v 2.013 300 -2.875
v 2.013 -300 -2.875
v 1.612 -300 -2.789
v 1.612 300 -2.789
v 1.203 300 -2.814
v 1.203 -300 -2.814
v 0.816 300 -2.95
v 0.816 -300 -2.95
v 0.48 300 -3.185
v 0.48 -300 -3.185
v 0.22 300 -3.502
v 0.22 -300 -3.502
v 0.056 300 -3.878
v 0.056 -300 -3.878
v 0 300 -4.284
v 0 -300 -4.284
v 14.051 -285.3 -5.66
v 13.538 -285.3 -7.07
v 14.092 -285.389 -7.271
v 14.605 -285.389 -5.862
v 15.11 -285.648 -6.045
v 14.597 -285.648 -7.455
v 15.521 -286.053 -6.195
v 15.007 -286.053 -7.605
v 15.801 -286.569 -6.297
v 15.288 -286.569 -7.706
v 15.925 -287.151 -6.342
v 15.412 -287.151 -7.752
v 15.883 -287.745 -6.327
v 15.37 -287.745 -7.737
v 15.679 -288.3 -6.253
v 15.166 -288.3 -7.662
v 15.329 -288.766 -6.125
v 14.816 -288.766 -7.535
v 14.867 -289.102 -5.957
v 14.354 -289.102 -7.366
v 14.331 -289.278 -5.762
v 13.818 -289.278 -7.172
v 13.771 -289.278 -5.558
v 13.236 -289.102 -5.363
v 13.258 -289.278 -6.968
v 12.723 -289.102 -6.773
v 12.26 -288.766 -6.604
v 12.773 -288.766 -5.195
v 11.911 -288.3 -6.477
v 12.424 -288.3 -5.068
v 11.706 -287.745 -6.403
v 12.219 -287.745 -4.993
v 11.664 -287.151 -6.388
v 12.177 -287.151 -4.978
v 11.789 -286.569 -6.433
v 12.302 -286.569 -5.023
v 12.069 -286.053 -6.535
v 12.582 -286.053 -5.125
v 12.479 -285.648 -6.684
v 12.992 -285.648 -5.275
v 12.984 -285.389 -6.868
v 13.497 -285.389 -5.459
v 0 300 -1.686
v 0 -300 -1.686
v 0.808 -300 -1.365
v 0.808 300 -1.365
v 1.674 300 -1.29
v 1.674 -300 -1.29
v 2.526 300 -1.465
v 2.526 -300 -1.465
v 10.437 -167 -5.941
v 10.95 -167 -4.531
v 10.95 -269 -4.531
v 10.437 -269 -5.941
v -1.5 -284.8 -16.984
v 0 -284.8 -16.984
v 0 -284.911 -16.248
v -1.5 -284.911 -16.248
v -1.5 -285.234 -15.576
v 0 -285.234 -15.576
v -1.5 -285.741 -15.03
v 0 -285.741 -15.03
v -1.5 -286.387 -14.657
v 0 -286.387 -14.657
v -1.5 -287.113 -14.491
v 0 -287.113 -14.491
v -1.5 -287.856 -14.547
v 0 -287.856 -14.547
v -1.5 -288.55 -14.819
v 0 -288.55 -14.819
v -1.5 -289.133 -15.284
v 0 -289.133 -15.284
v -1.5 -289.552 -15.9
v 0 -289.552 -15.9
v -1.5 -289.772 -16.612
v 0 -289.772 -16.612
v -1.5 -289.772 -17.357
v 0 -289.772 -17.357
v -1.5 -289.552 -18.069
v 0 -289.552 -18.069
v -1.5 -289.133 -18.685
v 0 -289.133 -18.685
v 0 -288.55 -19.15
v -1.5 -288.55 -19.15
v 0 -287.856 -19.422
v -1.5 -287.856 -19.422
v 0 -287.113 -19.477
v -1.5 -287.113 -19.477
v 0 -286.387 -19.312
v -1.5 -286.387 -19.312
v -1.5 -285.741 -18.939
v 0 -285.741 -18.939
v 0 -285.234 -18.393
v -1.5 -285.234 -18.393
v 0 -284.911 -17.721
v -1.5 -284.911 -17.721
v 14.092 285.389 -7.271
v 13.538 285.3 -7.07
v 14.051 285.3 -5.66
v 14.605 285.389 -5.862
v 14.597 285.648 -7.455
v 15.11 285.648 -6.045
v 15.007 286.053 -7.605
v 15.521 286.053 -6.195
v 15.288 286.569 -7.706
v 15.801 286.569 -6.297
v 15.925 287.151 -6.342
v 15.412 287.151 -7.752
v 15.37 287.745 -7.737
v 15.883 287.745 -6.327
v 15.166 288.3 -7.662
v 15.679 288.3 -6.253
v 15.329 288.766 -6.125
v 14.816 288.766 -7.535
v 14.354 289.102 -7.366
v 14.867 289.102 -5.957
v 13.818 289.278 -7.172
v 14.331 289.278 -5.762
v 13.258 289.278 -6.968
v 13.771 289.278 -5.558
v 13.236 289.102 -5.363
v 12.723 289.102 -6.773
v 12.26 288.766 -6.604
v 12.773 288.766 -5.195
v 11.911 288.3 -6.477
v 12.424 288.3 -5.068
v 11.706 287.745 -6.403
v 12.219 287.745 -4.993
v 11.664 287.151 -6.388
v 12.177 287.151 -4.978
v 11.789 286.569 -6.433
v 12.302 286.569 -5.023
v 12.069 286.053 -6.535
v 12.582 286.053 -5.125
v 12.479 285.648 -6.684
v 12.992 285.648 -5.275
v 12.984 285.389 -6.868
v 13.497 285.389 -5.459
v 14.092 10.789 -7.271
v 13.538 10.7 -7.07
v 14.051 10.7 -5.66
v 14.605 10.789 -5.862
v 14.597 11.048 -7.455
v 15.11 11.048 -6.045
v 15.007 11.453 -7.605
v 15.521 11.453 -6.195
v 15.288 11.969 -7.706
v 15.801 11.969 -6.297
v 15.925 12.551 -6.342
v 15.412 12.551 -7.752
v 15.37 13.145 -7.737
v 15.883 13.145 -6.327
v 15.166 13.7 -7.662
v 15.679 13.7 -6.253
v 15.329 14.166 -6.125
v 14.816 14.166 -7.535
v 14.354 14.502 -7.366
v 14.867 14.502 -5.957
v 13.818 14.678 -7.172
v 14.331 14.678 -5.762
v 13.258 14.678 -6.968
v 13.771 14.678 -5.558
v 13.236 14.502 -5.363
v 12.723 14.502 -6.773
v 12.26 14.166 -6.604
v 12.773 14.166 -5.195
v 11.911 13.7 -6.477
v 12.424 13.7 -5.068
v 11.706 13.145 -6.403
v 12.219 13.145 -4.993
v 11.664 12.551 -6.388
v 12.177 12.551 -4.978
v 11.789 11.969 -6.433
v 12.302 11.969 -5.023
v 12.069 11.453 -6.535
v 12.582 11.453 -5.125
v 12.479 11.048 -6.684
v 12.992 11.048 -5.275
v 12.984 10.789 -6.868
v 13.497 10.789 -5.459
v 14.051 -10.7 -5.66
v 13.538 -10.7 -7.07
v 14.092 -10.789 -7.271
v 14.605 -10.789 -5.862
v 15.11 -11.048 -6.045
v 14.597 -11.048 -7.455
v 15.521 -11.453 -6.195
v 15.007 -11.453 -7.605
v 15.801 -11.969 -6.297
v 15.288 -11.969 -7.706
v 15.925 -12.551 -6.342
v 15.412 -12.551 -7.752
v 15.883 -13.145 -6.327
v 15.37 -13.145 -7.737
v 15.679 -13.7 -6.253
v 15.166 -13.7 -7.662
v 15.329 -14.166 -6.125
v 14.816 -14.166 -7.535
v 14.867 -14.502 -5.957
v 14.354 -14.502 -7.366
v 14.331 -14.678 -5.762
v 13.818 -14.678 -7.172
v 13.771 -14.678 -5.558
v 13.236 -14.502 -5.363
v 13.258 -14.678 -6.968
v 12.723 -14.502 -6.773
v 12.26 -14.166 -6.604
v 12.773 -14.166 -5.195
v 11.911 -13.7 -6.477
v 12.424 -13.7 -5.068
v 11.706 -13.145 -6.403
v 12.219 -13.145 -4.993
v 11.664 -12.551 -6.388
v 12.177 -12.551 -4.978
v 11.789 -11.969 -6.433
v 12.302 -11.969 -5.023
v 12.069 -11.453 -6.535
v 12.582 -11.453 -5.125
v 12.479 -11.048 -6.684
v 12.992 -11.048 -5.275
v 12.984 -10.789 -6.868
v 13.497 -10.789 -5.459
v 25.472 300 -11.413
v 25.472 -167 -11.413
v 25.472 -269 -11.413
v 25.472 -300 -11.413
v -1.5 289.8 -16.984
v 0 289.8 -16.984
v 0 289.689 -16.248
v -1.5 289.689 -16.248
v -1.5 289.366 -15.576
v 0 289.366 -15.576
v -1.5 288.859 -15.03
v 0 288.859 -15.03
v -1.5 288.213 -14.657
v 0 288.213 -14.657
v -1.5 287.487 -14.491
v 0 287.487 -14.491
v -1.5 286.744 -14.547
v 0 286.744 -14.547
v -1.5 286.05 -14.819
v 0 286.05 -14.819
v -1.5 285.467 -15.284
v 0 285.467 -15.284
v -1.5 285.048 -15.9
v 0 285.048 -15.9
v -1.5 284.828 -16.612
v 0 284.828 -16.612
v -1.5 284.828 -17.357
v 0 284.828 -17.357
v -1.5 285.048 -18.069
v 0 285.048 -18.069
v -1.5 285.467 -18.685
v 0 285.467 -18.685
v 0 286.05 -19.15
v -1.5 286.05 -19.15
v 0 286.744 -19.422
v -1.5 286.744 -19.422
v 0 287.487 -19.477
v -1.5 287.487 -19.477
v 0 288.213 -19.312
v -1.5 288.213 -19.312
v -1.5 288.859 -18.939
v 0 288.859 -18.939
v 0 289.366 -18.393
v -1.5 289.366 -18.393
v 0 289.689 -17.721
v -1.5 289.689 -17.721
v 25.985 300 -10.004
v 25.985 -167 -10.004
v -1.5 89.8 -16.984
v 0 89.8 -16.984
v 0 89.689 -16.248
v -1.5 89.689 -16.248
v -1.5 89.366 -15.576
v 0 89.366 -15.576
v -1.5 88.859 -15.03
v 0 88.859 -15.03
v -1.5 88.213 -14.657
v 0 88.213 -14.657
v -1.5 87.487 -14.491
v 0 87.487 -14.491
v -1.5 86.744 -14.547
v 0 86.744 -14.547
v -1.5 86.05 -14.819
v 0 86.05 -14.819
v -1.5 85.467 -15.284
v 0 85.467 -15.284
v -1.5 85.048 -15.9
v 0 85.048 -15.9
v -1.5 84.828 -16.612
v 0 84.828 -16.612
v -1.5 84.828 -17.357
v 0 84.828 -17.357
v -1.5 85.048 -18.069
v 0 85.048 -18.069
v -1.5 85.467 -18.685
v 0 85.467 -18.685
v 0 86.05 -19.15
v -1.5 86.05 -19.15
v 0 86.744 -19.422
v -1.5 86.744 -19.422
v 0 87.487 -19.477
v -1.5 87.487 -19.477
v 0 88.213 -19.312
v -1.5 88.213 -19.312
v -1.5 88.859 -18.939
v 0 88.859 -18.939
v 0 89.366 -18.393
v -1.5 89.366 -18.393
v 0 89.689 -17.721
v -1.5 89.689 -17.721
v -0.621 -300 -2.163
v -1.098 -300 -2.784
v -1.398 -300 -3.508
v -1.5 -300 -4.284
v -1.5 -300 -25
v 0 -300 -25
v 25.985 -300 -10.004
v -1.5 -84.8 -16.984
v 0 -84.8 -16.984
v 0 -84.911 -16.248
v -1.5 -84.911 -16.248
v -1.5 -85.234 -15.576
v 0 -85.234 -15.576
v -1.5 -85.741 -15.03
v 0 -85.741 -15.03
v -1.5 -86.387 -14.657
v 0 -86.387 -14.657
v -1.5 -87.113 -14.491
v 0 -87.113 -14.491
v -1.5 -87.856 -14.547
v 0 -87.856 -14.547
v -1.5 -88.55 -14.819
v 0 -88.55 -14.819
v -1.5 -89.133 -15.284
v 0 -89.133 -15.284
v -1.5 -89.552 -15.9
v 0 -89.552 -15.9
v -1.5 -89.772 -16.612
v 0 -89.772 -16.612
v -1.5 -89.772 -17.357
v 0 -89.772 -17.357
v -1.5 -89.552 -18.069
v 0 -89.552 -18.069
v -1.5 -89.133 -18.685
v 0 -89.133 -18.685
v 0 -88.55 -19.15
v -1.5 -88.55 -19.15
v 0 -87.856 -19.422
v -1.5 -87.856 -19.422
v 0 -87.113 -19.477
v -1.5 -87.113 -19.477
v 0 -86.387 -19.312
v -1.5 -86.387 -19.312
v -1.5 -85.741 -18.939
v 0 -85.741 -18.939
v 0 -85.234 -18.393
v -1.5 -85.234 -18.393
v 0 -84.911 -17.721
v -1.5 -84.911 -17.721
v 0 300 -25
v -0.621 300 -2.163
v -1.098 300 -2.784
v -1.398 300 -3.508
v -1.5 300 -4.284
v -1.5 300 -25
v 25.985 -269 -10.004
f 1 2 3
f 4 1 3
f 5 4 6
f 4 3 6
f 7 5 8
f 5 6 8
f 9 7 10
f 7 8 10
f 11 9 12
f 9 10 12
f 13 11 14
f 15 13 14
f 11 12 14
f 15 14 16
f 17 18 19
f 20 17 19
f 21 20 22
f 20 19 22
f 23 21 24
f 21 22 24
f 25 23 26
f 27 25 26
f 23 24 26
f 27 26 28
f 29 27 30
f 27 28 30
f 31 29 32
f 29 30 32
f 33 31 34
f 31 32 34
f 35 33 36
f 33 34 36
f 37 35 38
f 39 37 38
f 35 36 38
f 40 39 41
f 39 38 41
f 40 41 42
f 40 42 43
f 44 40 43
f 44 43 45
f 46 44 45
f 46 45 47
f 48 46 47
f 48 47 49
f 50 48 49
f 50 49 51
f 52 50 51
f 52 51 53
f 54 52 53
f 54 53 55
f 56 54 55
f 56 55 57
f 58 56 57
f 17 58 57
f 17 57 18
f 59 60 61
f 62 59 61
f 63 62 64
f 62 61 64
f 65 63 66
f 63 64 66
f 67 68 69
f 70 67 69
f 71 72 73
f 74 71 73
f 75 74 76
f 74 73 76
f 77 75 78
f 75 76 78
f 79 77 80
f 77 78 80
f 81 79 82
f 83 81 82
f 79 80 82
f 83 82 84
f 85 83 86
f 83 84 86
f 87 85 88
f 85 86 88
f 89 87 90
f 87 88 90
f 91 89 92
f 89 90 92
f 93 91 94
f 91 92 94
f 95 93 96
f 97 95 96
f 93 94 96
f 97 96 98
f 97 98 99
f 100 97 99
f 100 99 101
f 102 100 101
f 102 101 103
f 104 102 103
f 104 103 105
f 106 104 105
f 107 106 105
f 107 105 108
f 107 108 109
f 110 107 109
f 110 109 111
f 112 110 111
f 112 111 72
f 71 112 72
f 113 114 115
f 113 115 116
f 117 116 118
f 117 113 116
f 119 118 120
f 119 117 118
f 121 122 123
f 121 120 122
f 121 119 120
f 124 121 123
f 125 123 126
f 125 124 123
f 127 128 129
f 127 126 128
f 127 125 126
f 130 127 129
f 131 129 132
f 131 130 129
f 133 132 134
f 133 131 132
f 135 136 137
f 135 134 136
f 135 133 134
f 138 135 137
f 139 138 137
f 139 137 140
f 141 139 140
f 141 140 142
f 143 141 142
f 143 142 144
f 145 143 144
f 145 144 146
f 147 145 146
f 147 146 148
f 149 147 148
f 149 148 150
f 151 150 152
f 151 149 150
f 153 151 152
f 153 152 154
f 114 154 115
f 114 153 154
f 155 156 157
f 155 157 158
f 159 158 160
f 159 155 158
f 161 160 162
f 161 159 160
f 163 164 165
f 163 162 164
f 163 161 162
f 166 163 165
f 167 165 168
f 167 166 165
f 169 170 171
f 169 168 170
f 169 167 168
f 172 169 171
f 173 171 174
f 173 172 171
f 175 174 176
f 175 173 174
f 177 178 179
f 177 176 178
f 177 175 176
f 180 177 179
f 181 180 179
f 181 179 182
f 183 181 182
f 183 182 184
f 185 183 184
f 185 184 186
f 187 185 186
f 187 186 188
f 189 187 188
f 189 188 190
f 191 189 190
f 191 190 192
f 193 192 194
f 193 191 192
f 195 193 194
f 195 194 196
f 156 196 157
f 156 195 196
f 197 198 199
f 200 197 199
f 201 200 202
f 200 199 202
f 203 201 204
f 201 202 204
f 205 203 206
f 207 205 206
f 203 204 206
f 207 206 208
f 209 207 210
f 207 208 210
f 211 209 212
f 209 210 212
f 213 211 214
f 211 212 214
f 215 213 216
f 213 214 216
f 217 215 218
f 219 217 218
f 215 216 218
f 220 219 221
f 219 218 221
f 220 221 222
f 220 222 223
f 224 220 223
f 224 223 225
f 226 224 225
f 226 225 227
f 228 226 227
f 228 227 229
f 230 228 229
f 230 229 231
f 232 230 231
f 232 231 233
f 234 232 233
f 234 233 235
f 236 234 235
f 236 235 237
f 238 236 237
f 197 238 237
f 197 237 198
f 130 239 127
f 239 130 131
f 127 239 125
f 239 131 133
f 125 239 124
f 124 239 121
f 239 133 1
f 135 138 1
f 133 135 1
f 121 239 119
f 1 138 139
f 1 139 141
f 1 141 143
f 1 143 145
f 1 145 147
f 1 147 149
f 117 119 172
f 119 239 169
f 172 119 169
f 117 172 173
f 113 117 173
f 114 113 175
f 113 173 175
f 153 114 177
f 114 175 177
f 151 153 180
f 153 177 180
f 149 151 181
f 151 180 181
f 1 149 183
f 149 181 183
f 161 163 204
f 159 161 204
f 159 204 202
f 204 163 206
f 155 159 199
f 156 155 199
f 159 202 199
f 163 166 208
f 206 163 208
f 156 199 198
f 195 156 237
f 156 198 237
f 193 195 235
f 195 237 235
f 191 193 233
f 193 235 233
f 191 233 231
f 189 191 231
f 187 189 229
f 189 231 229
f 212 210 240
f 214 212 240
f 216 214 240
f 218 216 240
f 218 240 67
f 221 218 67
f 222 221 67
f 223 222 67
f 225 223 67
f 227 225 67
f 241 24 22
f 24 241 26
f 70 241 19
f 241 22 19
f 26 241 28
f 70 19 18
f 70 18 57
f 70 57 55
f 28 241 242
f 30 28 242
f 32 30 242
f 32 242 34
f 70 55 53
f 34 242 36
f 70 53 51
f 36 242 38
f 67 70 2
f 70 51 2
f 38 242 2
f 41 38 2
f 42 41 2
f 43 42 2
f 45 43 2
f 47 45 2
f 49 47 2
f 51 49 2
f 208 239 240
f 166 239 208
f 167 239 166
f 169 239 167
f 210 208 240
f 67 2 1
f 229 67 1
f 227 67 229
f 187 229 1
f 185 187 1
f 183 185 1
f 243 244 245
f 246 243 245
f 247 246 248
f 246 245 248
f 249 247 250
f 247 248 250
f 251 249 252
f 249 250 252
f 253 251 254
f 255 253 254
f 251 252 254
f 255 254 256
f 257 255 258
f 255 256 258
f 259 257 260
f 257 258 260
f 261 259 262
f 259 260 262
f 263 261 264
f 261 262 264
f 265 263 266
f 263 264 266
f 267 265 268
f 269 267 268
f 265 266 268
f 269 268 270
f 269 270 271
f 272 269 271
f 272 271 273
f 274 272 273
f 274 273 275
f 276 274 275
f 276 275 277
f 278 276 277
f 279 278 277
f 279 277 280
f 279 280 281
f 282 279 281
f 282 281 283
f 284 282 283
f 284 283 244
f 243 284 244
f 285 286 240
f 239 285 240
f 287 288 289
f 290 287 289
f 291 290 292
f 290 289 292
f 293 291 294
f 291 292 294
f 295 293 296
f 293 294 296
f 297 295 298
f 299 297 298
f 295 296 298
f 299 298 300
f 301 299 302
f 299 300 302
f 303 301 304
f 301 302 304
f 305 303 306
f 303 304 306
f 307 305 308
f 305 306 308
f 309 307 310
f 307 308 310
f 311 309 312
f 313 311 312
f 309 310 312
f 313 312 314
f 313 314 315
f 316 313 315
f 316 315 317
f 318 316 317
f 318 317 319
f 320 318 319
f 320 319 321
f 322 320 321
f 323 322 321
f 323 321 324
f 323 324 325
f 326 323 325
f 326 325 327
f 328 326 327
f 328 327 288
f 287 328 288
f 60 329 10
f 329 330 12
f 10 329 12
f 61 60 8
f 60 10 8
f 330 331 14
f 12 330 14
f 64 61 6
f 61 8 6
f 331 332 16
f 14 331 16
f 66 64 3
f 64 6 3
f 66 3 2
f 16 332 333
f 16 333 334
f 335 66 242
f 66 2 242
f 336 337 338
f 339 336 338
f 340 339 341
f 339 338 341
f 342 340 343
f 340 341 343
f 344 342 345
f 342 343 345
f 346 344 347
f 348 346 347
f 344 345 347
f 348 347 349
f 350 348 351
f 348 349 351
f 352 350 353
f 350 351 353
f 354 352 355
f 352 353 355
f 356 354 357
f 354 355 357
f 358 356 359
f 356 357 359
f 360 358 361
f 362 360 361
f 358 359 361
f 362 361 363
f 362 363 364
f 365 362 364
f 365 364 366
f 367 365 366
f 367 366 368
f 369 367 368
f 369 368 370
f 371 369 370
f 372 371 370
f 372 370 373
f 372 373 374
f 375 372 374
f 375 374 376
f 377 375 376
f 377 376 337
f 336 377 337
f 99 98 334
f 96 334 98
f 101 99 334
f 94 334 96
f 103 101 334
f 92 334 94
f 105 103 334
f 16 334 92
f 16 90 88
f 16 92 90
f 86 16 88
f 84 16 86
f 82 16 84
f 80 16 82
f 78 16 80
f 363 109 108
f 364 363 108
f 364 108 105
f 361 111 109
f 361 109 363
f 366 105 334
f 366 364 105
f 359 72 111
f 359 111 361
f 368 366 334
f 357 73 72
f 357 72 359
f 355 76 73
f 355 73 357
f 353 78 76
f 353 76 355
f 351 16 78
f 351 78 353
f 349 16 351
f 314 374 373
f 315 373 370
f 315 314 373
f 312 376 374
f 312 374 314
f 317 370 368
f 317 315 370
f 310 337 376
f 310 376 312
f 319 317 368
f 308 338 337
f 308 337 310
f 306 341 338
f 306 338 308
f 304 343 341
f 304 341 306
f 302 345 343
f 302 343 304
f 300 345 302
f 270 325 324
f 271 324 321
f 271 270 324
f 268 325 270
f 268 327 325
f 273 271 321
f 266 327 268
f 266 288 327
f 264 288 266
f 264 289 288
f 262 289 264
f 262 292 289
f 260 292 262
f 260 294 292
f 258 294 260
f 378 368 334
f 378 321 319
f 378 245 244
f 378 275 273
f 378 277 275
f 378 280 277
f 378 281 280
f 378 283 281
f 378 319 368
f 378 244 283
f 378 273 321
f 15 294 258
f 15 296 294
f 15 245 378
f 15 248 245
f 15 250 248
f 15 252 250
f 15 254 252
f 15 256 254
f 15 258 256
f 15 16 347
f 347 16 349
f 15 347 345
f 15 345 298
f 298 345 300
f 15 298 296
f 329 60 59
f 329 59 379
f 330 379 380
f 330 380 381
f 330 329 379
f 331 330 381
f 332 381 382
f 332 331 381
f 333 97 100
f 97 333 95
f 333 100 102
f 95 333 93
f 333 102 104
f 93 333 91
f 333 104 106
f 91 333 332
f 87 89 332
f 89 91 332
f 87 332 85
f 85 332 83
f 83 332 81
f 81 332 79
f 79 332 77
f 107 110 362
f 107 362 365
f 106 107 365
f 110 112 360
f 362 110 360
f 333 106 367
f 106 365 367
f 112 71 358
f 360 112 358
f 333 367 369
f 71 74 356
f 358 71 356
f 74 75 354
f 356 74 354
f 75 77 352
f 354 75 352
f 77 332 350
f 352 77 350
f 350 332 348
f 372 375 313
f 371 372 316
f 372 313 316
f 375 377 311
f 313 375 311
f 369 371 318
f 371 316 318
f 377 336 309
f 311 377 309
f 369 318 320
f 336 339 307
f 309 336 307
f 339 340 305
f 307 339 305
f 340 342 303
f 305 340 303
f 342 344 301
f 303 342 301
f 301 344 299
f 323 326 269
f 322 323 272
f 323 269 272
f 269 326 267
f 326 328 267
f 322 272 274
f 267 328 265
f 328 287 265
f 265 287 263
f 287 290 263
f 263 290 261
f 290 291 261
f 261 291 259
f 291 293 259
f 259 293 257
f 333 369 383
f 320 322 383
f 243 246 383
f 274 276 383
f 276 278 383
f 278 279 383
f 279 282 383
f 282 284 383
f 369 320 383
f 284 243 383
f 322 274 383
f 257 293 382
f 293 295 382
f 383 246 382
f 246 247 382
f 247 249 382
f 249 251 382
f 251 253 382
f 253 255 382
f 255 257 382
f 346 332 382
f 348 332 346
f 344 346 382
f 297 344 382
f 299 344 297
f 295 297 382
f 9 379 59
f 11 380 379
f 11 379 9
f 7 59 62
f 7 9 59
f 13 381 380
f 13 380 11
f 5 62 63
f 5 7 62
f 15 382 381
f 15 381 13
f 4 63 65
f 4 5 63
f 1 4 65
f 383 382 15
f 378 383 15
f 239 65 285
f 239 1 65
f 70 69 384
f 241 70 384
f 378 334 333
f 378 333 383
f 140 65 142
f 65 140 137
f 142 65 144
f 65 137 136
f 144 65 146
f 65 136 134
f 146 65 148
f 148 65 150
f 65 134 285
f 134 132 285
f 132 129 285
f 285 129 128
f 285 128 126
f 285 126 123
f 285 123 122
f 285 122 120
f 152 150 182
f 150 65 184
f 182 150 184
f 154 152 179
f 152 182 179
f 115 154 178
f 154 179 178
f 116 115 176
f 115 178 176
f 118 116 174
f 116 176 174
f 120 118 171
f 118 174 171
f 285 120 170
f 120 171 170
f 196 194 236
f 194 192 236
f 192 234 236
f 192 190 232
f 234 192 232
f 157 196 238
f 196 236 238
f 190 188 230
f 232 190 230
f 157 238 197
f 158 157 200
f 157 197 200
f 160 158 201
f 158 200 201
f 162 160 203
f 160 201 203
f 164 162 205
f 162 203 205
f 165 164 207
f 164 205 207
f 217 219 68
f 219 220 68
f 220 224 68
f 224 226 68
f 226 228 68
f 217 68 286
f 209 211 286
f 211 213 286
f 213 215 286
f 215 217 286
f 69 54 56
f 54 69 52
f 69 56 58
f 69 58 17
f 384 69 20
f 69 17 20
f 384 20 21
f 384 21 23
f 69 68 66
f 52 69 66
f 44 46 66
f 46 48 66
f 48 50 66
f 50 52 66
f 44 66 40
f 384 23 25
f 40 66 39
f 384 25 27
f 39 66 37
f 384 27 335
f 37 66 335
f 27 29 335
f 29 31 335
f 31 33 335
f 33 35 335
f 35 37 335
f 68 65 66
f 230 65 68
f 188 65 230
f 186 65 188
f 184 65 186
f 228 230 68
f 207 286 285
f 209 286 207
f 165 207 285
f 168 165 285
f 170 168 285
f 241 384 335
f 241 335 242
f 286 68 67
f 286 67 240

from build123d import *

# Parameters (mm, degrees)
SKETCH1_W                = 600
SKETCH1_H                = 50
BASE_FLANGE1_DEPTH       = 1.5
SKETCHED_START           = -300
SKETCHED_BEND2_DEPTH     = 600
SKETCHED_BEND2_2_DEPTH   = 600
F_4_0_4_DIAMETER_HOLE1_D = 4
F_5_0_5_DIAMETER_HOLE1_D = 5
CUT_EXTRUDE1_REACH       = 304.135
SKETCH11_W               = 102
SKETCH11_H               = 16


# Read off the part's stored shape, not the designer's step: Sketched Bend2
# Sheet-metal steps are written as plain solids
with BuildPart() as part:
    # Sketch1 → Base-Flange1 (new body)
    with BuildSketch(Plane.YZ):
        Rectangle(SKETCH1_W, SKETCH1_H)
    extrude(amount=-BASE_FLANGE1_DEPTH)

    # Sketched Bend2 outline → Sketched Bend2 (cut)
    with BuildSketch(Plane(origin=(0, 0, 0), x_dir=(1, 0, 0), z_dir=(0, 1, 0)).offset(SKETCHED_START)):
        with BuildLine():
            Line((0, -25), (0, 1.686367809))
            ThreePointArc((0, 1.686367809), (-1.098076211, 2.78444402), (-1.5, 4.28444402))
            Line((-1.5, 4.28444402), (-1.5, -25))
            Line((-1.5, -25), (0, -25))
        make_face()
    extrude(amount=SKETCHED_BEND2_DEPTH, mode=Mode.SUBTRACT)

    # Sketched Bend2 2 outline → Sketched Bend2 2 (add)
    with BuildSketch(Plane(origin=(0, 0, 0), x_dir=(1, 0, 0), z_dir=(0, 1, 0)).offset(SKETCHED_START)):
        with BuildLine():
            Line((2.52606043, 1.465366158), (25.985255658, 10.003814941))
            Line((25.985255658, 10.003814941), (25.472225443, 11.413353872))
            Line((25.472225443, 11.413353872), (2.013030215, 2.874905089))
            ThreePointArc((2.013030215, 2.874905089), (0.639635346, 3.055715954), (0, 4.28444402))
            Line((0, 4.28444402), (0, 1.686367809))
            ThreePointArc((0, 1.686367809), (1.238532772, 1.295859926), (2.52606043, 1.465366158))
        make_face()
    extrude(amount=SKETCHED_BEND2_2_DEPTH)

    # Ø4.0 (4) Diameter Hole1 (through all)
    with Locations(Plane(origin=(-0.175466668, 0, -0.482090707), x_dir=(0, -1, 0), z_dir=(0.3420201433256727, 0, 0.9396926207859071))):
        with Locations((287.3, 15.139659211), (12.7, 15.139659211)):
            f_4_0_4_diameter_hole1 = Hole(F_4_0_4_DIAMETER_HOLE1_D / 2)

    # Mirror1: Ø4.0 (4) Diameter Hole1 across plane
    add(f_4_0_4_diameter_hole1.mirror(Plane.ZX), mode=Mode.SUBTRACT)

    # Ø5.0 (5) Diameter Hole1 (through all)
    with Locations(Plane(origin=(-1.5, 0, 0), x_dir=(0, -1, 0), z_dir=(-1, 0, 0))):
        with Locations((-287.3, -16.98444402), (-87.3, -16.98444402), (87.3, -16.98444402), (287.3, -16.98444402)):
            Hole(F_5_0_5_DIAMETER_HOLE1_D / 2)

    # Sketch11 → Cut-Extrude1 (cut, up to next)
    with BuildSketch(Plane(origin=(-0.175466668, 0, -0.482090707), x_dir=(0, -1, 0), z_dir=(0.3420201433256727, 0, 0.9396926207859071)), mode=Mode.PRIVATE) as cut_extrude1_sk1:
        with Locations((218, 19.839659211)):
            Rectangle(SKETCH11_W, SKETCH11_H)
    cut_extrude1_tool1 = extrude(cut_extrude1_sk1.sketch, amount=-CUT_EXTRUDE1_REACH, mode=Mode.PRIVATE) & part.part
    add(cut_extrude1_tool1.solids().sort_by_distance((18.467715, -218, -7.267654))[0], mode=Mode.SUBTRACT)


solid = part.part
